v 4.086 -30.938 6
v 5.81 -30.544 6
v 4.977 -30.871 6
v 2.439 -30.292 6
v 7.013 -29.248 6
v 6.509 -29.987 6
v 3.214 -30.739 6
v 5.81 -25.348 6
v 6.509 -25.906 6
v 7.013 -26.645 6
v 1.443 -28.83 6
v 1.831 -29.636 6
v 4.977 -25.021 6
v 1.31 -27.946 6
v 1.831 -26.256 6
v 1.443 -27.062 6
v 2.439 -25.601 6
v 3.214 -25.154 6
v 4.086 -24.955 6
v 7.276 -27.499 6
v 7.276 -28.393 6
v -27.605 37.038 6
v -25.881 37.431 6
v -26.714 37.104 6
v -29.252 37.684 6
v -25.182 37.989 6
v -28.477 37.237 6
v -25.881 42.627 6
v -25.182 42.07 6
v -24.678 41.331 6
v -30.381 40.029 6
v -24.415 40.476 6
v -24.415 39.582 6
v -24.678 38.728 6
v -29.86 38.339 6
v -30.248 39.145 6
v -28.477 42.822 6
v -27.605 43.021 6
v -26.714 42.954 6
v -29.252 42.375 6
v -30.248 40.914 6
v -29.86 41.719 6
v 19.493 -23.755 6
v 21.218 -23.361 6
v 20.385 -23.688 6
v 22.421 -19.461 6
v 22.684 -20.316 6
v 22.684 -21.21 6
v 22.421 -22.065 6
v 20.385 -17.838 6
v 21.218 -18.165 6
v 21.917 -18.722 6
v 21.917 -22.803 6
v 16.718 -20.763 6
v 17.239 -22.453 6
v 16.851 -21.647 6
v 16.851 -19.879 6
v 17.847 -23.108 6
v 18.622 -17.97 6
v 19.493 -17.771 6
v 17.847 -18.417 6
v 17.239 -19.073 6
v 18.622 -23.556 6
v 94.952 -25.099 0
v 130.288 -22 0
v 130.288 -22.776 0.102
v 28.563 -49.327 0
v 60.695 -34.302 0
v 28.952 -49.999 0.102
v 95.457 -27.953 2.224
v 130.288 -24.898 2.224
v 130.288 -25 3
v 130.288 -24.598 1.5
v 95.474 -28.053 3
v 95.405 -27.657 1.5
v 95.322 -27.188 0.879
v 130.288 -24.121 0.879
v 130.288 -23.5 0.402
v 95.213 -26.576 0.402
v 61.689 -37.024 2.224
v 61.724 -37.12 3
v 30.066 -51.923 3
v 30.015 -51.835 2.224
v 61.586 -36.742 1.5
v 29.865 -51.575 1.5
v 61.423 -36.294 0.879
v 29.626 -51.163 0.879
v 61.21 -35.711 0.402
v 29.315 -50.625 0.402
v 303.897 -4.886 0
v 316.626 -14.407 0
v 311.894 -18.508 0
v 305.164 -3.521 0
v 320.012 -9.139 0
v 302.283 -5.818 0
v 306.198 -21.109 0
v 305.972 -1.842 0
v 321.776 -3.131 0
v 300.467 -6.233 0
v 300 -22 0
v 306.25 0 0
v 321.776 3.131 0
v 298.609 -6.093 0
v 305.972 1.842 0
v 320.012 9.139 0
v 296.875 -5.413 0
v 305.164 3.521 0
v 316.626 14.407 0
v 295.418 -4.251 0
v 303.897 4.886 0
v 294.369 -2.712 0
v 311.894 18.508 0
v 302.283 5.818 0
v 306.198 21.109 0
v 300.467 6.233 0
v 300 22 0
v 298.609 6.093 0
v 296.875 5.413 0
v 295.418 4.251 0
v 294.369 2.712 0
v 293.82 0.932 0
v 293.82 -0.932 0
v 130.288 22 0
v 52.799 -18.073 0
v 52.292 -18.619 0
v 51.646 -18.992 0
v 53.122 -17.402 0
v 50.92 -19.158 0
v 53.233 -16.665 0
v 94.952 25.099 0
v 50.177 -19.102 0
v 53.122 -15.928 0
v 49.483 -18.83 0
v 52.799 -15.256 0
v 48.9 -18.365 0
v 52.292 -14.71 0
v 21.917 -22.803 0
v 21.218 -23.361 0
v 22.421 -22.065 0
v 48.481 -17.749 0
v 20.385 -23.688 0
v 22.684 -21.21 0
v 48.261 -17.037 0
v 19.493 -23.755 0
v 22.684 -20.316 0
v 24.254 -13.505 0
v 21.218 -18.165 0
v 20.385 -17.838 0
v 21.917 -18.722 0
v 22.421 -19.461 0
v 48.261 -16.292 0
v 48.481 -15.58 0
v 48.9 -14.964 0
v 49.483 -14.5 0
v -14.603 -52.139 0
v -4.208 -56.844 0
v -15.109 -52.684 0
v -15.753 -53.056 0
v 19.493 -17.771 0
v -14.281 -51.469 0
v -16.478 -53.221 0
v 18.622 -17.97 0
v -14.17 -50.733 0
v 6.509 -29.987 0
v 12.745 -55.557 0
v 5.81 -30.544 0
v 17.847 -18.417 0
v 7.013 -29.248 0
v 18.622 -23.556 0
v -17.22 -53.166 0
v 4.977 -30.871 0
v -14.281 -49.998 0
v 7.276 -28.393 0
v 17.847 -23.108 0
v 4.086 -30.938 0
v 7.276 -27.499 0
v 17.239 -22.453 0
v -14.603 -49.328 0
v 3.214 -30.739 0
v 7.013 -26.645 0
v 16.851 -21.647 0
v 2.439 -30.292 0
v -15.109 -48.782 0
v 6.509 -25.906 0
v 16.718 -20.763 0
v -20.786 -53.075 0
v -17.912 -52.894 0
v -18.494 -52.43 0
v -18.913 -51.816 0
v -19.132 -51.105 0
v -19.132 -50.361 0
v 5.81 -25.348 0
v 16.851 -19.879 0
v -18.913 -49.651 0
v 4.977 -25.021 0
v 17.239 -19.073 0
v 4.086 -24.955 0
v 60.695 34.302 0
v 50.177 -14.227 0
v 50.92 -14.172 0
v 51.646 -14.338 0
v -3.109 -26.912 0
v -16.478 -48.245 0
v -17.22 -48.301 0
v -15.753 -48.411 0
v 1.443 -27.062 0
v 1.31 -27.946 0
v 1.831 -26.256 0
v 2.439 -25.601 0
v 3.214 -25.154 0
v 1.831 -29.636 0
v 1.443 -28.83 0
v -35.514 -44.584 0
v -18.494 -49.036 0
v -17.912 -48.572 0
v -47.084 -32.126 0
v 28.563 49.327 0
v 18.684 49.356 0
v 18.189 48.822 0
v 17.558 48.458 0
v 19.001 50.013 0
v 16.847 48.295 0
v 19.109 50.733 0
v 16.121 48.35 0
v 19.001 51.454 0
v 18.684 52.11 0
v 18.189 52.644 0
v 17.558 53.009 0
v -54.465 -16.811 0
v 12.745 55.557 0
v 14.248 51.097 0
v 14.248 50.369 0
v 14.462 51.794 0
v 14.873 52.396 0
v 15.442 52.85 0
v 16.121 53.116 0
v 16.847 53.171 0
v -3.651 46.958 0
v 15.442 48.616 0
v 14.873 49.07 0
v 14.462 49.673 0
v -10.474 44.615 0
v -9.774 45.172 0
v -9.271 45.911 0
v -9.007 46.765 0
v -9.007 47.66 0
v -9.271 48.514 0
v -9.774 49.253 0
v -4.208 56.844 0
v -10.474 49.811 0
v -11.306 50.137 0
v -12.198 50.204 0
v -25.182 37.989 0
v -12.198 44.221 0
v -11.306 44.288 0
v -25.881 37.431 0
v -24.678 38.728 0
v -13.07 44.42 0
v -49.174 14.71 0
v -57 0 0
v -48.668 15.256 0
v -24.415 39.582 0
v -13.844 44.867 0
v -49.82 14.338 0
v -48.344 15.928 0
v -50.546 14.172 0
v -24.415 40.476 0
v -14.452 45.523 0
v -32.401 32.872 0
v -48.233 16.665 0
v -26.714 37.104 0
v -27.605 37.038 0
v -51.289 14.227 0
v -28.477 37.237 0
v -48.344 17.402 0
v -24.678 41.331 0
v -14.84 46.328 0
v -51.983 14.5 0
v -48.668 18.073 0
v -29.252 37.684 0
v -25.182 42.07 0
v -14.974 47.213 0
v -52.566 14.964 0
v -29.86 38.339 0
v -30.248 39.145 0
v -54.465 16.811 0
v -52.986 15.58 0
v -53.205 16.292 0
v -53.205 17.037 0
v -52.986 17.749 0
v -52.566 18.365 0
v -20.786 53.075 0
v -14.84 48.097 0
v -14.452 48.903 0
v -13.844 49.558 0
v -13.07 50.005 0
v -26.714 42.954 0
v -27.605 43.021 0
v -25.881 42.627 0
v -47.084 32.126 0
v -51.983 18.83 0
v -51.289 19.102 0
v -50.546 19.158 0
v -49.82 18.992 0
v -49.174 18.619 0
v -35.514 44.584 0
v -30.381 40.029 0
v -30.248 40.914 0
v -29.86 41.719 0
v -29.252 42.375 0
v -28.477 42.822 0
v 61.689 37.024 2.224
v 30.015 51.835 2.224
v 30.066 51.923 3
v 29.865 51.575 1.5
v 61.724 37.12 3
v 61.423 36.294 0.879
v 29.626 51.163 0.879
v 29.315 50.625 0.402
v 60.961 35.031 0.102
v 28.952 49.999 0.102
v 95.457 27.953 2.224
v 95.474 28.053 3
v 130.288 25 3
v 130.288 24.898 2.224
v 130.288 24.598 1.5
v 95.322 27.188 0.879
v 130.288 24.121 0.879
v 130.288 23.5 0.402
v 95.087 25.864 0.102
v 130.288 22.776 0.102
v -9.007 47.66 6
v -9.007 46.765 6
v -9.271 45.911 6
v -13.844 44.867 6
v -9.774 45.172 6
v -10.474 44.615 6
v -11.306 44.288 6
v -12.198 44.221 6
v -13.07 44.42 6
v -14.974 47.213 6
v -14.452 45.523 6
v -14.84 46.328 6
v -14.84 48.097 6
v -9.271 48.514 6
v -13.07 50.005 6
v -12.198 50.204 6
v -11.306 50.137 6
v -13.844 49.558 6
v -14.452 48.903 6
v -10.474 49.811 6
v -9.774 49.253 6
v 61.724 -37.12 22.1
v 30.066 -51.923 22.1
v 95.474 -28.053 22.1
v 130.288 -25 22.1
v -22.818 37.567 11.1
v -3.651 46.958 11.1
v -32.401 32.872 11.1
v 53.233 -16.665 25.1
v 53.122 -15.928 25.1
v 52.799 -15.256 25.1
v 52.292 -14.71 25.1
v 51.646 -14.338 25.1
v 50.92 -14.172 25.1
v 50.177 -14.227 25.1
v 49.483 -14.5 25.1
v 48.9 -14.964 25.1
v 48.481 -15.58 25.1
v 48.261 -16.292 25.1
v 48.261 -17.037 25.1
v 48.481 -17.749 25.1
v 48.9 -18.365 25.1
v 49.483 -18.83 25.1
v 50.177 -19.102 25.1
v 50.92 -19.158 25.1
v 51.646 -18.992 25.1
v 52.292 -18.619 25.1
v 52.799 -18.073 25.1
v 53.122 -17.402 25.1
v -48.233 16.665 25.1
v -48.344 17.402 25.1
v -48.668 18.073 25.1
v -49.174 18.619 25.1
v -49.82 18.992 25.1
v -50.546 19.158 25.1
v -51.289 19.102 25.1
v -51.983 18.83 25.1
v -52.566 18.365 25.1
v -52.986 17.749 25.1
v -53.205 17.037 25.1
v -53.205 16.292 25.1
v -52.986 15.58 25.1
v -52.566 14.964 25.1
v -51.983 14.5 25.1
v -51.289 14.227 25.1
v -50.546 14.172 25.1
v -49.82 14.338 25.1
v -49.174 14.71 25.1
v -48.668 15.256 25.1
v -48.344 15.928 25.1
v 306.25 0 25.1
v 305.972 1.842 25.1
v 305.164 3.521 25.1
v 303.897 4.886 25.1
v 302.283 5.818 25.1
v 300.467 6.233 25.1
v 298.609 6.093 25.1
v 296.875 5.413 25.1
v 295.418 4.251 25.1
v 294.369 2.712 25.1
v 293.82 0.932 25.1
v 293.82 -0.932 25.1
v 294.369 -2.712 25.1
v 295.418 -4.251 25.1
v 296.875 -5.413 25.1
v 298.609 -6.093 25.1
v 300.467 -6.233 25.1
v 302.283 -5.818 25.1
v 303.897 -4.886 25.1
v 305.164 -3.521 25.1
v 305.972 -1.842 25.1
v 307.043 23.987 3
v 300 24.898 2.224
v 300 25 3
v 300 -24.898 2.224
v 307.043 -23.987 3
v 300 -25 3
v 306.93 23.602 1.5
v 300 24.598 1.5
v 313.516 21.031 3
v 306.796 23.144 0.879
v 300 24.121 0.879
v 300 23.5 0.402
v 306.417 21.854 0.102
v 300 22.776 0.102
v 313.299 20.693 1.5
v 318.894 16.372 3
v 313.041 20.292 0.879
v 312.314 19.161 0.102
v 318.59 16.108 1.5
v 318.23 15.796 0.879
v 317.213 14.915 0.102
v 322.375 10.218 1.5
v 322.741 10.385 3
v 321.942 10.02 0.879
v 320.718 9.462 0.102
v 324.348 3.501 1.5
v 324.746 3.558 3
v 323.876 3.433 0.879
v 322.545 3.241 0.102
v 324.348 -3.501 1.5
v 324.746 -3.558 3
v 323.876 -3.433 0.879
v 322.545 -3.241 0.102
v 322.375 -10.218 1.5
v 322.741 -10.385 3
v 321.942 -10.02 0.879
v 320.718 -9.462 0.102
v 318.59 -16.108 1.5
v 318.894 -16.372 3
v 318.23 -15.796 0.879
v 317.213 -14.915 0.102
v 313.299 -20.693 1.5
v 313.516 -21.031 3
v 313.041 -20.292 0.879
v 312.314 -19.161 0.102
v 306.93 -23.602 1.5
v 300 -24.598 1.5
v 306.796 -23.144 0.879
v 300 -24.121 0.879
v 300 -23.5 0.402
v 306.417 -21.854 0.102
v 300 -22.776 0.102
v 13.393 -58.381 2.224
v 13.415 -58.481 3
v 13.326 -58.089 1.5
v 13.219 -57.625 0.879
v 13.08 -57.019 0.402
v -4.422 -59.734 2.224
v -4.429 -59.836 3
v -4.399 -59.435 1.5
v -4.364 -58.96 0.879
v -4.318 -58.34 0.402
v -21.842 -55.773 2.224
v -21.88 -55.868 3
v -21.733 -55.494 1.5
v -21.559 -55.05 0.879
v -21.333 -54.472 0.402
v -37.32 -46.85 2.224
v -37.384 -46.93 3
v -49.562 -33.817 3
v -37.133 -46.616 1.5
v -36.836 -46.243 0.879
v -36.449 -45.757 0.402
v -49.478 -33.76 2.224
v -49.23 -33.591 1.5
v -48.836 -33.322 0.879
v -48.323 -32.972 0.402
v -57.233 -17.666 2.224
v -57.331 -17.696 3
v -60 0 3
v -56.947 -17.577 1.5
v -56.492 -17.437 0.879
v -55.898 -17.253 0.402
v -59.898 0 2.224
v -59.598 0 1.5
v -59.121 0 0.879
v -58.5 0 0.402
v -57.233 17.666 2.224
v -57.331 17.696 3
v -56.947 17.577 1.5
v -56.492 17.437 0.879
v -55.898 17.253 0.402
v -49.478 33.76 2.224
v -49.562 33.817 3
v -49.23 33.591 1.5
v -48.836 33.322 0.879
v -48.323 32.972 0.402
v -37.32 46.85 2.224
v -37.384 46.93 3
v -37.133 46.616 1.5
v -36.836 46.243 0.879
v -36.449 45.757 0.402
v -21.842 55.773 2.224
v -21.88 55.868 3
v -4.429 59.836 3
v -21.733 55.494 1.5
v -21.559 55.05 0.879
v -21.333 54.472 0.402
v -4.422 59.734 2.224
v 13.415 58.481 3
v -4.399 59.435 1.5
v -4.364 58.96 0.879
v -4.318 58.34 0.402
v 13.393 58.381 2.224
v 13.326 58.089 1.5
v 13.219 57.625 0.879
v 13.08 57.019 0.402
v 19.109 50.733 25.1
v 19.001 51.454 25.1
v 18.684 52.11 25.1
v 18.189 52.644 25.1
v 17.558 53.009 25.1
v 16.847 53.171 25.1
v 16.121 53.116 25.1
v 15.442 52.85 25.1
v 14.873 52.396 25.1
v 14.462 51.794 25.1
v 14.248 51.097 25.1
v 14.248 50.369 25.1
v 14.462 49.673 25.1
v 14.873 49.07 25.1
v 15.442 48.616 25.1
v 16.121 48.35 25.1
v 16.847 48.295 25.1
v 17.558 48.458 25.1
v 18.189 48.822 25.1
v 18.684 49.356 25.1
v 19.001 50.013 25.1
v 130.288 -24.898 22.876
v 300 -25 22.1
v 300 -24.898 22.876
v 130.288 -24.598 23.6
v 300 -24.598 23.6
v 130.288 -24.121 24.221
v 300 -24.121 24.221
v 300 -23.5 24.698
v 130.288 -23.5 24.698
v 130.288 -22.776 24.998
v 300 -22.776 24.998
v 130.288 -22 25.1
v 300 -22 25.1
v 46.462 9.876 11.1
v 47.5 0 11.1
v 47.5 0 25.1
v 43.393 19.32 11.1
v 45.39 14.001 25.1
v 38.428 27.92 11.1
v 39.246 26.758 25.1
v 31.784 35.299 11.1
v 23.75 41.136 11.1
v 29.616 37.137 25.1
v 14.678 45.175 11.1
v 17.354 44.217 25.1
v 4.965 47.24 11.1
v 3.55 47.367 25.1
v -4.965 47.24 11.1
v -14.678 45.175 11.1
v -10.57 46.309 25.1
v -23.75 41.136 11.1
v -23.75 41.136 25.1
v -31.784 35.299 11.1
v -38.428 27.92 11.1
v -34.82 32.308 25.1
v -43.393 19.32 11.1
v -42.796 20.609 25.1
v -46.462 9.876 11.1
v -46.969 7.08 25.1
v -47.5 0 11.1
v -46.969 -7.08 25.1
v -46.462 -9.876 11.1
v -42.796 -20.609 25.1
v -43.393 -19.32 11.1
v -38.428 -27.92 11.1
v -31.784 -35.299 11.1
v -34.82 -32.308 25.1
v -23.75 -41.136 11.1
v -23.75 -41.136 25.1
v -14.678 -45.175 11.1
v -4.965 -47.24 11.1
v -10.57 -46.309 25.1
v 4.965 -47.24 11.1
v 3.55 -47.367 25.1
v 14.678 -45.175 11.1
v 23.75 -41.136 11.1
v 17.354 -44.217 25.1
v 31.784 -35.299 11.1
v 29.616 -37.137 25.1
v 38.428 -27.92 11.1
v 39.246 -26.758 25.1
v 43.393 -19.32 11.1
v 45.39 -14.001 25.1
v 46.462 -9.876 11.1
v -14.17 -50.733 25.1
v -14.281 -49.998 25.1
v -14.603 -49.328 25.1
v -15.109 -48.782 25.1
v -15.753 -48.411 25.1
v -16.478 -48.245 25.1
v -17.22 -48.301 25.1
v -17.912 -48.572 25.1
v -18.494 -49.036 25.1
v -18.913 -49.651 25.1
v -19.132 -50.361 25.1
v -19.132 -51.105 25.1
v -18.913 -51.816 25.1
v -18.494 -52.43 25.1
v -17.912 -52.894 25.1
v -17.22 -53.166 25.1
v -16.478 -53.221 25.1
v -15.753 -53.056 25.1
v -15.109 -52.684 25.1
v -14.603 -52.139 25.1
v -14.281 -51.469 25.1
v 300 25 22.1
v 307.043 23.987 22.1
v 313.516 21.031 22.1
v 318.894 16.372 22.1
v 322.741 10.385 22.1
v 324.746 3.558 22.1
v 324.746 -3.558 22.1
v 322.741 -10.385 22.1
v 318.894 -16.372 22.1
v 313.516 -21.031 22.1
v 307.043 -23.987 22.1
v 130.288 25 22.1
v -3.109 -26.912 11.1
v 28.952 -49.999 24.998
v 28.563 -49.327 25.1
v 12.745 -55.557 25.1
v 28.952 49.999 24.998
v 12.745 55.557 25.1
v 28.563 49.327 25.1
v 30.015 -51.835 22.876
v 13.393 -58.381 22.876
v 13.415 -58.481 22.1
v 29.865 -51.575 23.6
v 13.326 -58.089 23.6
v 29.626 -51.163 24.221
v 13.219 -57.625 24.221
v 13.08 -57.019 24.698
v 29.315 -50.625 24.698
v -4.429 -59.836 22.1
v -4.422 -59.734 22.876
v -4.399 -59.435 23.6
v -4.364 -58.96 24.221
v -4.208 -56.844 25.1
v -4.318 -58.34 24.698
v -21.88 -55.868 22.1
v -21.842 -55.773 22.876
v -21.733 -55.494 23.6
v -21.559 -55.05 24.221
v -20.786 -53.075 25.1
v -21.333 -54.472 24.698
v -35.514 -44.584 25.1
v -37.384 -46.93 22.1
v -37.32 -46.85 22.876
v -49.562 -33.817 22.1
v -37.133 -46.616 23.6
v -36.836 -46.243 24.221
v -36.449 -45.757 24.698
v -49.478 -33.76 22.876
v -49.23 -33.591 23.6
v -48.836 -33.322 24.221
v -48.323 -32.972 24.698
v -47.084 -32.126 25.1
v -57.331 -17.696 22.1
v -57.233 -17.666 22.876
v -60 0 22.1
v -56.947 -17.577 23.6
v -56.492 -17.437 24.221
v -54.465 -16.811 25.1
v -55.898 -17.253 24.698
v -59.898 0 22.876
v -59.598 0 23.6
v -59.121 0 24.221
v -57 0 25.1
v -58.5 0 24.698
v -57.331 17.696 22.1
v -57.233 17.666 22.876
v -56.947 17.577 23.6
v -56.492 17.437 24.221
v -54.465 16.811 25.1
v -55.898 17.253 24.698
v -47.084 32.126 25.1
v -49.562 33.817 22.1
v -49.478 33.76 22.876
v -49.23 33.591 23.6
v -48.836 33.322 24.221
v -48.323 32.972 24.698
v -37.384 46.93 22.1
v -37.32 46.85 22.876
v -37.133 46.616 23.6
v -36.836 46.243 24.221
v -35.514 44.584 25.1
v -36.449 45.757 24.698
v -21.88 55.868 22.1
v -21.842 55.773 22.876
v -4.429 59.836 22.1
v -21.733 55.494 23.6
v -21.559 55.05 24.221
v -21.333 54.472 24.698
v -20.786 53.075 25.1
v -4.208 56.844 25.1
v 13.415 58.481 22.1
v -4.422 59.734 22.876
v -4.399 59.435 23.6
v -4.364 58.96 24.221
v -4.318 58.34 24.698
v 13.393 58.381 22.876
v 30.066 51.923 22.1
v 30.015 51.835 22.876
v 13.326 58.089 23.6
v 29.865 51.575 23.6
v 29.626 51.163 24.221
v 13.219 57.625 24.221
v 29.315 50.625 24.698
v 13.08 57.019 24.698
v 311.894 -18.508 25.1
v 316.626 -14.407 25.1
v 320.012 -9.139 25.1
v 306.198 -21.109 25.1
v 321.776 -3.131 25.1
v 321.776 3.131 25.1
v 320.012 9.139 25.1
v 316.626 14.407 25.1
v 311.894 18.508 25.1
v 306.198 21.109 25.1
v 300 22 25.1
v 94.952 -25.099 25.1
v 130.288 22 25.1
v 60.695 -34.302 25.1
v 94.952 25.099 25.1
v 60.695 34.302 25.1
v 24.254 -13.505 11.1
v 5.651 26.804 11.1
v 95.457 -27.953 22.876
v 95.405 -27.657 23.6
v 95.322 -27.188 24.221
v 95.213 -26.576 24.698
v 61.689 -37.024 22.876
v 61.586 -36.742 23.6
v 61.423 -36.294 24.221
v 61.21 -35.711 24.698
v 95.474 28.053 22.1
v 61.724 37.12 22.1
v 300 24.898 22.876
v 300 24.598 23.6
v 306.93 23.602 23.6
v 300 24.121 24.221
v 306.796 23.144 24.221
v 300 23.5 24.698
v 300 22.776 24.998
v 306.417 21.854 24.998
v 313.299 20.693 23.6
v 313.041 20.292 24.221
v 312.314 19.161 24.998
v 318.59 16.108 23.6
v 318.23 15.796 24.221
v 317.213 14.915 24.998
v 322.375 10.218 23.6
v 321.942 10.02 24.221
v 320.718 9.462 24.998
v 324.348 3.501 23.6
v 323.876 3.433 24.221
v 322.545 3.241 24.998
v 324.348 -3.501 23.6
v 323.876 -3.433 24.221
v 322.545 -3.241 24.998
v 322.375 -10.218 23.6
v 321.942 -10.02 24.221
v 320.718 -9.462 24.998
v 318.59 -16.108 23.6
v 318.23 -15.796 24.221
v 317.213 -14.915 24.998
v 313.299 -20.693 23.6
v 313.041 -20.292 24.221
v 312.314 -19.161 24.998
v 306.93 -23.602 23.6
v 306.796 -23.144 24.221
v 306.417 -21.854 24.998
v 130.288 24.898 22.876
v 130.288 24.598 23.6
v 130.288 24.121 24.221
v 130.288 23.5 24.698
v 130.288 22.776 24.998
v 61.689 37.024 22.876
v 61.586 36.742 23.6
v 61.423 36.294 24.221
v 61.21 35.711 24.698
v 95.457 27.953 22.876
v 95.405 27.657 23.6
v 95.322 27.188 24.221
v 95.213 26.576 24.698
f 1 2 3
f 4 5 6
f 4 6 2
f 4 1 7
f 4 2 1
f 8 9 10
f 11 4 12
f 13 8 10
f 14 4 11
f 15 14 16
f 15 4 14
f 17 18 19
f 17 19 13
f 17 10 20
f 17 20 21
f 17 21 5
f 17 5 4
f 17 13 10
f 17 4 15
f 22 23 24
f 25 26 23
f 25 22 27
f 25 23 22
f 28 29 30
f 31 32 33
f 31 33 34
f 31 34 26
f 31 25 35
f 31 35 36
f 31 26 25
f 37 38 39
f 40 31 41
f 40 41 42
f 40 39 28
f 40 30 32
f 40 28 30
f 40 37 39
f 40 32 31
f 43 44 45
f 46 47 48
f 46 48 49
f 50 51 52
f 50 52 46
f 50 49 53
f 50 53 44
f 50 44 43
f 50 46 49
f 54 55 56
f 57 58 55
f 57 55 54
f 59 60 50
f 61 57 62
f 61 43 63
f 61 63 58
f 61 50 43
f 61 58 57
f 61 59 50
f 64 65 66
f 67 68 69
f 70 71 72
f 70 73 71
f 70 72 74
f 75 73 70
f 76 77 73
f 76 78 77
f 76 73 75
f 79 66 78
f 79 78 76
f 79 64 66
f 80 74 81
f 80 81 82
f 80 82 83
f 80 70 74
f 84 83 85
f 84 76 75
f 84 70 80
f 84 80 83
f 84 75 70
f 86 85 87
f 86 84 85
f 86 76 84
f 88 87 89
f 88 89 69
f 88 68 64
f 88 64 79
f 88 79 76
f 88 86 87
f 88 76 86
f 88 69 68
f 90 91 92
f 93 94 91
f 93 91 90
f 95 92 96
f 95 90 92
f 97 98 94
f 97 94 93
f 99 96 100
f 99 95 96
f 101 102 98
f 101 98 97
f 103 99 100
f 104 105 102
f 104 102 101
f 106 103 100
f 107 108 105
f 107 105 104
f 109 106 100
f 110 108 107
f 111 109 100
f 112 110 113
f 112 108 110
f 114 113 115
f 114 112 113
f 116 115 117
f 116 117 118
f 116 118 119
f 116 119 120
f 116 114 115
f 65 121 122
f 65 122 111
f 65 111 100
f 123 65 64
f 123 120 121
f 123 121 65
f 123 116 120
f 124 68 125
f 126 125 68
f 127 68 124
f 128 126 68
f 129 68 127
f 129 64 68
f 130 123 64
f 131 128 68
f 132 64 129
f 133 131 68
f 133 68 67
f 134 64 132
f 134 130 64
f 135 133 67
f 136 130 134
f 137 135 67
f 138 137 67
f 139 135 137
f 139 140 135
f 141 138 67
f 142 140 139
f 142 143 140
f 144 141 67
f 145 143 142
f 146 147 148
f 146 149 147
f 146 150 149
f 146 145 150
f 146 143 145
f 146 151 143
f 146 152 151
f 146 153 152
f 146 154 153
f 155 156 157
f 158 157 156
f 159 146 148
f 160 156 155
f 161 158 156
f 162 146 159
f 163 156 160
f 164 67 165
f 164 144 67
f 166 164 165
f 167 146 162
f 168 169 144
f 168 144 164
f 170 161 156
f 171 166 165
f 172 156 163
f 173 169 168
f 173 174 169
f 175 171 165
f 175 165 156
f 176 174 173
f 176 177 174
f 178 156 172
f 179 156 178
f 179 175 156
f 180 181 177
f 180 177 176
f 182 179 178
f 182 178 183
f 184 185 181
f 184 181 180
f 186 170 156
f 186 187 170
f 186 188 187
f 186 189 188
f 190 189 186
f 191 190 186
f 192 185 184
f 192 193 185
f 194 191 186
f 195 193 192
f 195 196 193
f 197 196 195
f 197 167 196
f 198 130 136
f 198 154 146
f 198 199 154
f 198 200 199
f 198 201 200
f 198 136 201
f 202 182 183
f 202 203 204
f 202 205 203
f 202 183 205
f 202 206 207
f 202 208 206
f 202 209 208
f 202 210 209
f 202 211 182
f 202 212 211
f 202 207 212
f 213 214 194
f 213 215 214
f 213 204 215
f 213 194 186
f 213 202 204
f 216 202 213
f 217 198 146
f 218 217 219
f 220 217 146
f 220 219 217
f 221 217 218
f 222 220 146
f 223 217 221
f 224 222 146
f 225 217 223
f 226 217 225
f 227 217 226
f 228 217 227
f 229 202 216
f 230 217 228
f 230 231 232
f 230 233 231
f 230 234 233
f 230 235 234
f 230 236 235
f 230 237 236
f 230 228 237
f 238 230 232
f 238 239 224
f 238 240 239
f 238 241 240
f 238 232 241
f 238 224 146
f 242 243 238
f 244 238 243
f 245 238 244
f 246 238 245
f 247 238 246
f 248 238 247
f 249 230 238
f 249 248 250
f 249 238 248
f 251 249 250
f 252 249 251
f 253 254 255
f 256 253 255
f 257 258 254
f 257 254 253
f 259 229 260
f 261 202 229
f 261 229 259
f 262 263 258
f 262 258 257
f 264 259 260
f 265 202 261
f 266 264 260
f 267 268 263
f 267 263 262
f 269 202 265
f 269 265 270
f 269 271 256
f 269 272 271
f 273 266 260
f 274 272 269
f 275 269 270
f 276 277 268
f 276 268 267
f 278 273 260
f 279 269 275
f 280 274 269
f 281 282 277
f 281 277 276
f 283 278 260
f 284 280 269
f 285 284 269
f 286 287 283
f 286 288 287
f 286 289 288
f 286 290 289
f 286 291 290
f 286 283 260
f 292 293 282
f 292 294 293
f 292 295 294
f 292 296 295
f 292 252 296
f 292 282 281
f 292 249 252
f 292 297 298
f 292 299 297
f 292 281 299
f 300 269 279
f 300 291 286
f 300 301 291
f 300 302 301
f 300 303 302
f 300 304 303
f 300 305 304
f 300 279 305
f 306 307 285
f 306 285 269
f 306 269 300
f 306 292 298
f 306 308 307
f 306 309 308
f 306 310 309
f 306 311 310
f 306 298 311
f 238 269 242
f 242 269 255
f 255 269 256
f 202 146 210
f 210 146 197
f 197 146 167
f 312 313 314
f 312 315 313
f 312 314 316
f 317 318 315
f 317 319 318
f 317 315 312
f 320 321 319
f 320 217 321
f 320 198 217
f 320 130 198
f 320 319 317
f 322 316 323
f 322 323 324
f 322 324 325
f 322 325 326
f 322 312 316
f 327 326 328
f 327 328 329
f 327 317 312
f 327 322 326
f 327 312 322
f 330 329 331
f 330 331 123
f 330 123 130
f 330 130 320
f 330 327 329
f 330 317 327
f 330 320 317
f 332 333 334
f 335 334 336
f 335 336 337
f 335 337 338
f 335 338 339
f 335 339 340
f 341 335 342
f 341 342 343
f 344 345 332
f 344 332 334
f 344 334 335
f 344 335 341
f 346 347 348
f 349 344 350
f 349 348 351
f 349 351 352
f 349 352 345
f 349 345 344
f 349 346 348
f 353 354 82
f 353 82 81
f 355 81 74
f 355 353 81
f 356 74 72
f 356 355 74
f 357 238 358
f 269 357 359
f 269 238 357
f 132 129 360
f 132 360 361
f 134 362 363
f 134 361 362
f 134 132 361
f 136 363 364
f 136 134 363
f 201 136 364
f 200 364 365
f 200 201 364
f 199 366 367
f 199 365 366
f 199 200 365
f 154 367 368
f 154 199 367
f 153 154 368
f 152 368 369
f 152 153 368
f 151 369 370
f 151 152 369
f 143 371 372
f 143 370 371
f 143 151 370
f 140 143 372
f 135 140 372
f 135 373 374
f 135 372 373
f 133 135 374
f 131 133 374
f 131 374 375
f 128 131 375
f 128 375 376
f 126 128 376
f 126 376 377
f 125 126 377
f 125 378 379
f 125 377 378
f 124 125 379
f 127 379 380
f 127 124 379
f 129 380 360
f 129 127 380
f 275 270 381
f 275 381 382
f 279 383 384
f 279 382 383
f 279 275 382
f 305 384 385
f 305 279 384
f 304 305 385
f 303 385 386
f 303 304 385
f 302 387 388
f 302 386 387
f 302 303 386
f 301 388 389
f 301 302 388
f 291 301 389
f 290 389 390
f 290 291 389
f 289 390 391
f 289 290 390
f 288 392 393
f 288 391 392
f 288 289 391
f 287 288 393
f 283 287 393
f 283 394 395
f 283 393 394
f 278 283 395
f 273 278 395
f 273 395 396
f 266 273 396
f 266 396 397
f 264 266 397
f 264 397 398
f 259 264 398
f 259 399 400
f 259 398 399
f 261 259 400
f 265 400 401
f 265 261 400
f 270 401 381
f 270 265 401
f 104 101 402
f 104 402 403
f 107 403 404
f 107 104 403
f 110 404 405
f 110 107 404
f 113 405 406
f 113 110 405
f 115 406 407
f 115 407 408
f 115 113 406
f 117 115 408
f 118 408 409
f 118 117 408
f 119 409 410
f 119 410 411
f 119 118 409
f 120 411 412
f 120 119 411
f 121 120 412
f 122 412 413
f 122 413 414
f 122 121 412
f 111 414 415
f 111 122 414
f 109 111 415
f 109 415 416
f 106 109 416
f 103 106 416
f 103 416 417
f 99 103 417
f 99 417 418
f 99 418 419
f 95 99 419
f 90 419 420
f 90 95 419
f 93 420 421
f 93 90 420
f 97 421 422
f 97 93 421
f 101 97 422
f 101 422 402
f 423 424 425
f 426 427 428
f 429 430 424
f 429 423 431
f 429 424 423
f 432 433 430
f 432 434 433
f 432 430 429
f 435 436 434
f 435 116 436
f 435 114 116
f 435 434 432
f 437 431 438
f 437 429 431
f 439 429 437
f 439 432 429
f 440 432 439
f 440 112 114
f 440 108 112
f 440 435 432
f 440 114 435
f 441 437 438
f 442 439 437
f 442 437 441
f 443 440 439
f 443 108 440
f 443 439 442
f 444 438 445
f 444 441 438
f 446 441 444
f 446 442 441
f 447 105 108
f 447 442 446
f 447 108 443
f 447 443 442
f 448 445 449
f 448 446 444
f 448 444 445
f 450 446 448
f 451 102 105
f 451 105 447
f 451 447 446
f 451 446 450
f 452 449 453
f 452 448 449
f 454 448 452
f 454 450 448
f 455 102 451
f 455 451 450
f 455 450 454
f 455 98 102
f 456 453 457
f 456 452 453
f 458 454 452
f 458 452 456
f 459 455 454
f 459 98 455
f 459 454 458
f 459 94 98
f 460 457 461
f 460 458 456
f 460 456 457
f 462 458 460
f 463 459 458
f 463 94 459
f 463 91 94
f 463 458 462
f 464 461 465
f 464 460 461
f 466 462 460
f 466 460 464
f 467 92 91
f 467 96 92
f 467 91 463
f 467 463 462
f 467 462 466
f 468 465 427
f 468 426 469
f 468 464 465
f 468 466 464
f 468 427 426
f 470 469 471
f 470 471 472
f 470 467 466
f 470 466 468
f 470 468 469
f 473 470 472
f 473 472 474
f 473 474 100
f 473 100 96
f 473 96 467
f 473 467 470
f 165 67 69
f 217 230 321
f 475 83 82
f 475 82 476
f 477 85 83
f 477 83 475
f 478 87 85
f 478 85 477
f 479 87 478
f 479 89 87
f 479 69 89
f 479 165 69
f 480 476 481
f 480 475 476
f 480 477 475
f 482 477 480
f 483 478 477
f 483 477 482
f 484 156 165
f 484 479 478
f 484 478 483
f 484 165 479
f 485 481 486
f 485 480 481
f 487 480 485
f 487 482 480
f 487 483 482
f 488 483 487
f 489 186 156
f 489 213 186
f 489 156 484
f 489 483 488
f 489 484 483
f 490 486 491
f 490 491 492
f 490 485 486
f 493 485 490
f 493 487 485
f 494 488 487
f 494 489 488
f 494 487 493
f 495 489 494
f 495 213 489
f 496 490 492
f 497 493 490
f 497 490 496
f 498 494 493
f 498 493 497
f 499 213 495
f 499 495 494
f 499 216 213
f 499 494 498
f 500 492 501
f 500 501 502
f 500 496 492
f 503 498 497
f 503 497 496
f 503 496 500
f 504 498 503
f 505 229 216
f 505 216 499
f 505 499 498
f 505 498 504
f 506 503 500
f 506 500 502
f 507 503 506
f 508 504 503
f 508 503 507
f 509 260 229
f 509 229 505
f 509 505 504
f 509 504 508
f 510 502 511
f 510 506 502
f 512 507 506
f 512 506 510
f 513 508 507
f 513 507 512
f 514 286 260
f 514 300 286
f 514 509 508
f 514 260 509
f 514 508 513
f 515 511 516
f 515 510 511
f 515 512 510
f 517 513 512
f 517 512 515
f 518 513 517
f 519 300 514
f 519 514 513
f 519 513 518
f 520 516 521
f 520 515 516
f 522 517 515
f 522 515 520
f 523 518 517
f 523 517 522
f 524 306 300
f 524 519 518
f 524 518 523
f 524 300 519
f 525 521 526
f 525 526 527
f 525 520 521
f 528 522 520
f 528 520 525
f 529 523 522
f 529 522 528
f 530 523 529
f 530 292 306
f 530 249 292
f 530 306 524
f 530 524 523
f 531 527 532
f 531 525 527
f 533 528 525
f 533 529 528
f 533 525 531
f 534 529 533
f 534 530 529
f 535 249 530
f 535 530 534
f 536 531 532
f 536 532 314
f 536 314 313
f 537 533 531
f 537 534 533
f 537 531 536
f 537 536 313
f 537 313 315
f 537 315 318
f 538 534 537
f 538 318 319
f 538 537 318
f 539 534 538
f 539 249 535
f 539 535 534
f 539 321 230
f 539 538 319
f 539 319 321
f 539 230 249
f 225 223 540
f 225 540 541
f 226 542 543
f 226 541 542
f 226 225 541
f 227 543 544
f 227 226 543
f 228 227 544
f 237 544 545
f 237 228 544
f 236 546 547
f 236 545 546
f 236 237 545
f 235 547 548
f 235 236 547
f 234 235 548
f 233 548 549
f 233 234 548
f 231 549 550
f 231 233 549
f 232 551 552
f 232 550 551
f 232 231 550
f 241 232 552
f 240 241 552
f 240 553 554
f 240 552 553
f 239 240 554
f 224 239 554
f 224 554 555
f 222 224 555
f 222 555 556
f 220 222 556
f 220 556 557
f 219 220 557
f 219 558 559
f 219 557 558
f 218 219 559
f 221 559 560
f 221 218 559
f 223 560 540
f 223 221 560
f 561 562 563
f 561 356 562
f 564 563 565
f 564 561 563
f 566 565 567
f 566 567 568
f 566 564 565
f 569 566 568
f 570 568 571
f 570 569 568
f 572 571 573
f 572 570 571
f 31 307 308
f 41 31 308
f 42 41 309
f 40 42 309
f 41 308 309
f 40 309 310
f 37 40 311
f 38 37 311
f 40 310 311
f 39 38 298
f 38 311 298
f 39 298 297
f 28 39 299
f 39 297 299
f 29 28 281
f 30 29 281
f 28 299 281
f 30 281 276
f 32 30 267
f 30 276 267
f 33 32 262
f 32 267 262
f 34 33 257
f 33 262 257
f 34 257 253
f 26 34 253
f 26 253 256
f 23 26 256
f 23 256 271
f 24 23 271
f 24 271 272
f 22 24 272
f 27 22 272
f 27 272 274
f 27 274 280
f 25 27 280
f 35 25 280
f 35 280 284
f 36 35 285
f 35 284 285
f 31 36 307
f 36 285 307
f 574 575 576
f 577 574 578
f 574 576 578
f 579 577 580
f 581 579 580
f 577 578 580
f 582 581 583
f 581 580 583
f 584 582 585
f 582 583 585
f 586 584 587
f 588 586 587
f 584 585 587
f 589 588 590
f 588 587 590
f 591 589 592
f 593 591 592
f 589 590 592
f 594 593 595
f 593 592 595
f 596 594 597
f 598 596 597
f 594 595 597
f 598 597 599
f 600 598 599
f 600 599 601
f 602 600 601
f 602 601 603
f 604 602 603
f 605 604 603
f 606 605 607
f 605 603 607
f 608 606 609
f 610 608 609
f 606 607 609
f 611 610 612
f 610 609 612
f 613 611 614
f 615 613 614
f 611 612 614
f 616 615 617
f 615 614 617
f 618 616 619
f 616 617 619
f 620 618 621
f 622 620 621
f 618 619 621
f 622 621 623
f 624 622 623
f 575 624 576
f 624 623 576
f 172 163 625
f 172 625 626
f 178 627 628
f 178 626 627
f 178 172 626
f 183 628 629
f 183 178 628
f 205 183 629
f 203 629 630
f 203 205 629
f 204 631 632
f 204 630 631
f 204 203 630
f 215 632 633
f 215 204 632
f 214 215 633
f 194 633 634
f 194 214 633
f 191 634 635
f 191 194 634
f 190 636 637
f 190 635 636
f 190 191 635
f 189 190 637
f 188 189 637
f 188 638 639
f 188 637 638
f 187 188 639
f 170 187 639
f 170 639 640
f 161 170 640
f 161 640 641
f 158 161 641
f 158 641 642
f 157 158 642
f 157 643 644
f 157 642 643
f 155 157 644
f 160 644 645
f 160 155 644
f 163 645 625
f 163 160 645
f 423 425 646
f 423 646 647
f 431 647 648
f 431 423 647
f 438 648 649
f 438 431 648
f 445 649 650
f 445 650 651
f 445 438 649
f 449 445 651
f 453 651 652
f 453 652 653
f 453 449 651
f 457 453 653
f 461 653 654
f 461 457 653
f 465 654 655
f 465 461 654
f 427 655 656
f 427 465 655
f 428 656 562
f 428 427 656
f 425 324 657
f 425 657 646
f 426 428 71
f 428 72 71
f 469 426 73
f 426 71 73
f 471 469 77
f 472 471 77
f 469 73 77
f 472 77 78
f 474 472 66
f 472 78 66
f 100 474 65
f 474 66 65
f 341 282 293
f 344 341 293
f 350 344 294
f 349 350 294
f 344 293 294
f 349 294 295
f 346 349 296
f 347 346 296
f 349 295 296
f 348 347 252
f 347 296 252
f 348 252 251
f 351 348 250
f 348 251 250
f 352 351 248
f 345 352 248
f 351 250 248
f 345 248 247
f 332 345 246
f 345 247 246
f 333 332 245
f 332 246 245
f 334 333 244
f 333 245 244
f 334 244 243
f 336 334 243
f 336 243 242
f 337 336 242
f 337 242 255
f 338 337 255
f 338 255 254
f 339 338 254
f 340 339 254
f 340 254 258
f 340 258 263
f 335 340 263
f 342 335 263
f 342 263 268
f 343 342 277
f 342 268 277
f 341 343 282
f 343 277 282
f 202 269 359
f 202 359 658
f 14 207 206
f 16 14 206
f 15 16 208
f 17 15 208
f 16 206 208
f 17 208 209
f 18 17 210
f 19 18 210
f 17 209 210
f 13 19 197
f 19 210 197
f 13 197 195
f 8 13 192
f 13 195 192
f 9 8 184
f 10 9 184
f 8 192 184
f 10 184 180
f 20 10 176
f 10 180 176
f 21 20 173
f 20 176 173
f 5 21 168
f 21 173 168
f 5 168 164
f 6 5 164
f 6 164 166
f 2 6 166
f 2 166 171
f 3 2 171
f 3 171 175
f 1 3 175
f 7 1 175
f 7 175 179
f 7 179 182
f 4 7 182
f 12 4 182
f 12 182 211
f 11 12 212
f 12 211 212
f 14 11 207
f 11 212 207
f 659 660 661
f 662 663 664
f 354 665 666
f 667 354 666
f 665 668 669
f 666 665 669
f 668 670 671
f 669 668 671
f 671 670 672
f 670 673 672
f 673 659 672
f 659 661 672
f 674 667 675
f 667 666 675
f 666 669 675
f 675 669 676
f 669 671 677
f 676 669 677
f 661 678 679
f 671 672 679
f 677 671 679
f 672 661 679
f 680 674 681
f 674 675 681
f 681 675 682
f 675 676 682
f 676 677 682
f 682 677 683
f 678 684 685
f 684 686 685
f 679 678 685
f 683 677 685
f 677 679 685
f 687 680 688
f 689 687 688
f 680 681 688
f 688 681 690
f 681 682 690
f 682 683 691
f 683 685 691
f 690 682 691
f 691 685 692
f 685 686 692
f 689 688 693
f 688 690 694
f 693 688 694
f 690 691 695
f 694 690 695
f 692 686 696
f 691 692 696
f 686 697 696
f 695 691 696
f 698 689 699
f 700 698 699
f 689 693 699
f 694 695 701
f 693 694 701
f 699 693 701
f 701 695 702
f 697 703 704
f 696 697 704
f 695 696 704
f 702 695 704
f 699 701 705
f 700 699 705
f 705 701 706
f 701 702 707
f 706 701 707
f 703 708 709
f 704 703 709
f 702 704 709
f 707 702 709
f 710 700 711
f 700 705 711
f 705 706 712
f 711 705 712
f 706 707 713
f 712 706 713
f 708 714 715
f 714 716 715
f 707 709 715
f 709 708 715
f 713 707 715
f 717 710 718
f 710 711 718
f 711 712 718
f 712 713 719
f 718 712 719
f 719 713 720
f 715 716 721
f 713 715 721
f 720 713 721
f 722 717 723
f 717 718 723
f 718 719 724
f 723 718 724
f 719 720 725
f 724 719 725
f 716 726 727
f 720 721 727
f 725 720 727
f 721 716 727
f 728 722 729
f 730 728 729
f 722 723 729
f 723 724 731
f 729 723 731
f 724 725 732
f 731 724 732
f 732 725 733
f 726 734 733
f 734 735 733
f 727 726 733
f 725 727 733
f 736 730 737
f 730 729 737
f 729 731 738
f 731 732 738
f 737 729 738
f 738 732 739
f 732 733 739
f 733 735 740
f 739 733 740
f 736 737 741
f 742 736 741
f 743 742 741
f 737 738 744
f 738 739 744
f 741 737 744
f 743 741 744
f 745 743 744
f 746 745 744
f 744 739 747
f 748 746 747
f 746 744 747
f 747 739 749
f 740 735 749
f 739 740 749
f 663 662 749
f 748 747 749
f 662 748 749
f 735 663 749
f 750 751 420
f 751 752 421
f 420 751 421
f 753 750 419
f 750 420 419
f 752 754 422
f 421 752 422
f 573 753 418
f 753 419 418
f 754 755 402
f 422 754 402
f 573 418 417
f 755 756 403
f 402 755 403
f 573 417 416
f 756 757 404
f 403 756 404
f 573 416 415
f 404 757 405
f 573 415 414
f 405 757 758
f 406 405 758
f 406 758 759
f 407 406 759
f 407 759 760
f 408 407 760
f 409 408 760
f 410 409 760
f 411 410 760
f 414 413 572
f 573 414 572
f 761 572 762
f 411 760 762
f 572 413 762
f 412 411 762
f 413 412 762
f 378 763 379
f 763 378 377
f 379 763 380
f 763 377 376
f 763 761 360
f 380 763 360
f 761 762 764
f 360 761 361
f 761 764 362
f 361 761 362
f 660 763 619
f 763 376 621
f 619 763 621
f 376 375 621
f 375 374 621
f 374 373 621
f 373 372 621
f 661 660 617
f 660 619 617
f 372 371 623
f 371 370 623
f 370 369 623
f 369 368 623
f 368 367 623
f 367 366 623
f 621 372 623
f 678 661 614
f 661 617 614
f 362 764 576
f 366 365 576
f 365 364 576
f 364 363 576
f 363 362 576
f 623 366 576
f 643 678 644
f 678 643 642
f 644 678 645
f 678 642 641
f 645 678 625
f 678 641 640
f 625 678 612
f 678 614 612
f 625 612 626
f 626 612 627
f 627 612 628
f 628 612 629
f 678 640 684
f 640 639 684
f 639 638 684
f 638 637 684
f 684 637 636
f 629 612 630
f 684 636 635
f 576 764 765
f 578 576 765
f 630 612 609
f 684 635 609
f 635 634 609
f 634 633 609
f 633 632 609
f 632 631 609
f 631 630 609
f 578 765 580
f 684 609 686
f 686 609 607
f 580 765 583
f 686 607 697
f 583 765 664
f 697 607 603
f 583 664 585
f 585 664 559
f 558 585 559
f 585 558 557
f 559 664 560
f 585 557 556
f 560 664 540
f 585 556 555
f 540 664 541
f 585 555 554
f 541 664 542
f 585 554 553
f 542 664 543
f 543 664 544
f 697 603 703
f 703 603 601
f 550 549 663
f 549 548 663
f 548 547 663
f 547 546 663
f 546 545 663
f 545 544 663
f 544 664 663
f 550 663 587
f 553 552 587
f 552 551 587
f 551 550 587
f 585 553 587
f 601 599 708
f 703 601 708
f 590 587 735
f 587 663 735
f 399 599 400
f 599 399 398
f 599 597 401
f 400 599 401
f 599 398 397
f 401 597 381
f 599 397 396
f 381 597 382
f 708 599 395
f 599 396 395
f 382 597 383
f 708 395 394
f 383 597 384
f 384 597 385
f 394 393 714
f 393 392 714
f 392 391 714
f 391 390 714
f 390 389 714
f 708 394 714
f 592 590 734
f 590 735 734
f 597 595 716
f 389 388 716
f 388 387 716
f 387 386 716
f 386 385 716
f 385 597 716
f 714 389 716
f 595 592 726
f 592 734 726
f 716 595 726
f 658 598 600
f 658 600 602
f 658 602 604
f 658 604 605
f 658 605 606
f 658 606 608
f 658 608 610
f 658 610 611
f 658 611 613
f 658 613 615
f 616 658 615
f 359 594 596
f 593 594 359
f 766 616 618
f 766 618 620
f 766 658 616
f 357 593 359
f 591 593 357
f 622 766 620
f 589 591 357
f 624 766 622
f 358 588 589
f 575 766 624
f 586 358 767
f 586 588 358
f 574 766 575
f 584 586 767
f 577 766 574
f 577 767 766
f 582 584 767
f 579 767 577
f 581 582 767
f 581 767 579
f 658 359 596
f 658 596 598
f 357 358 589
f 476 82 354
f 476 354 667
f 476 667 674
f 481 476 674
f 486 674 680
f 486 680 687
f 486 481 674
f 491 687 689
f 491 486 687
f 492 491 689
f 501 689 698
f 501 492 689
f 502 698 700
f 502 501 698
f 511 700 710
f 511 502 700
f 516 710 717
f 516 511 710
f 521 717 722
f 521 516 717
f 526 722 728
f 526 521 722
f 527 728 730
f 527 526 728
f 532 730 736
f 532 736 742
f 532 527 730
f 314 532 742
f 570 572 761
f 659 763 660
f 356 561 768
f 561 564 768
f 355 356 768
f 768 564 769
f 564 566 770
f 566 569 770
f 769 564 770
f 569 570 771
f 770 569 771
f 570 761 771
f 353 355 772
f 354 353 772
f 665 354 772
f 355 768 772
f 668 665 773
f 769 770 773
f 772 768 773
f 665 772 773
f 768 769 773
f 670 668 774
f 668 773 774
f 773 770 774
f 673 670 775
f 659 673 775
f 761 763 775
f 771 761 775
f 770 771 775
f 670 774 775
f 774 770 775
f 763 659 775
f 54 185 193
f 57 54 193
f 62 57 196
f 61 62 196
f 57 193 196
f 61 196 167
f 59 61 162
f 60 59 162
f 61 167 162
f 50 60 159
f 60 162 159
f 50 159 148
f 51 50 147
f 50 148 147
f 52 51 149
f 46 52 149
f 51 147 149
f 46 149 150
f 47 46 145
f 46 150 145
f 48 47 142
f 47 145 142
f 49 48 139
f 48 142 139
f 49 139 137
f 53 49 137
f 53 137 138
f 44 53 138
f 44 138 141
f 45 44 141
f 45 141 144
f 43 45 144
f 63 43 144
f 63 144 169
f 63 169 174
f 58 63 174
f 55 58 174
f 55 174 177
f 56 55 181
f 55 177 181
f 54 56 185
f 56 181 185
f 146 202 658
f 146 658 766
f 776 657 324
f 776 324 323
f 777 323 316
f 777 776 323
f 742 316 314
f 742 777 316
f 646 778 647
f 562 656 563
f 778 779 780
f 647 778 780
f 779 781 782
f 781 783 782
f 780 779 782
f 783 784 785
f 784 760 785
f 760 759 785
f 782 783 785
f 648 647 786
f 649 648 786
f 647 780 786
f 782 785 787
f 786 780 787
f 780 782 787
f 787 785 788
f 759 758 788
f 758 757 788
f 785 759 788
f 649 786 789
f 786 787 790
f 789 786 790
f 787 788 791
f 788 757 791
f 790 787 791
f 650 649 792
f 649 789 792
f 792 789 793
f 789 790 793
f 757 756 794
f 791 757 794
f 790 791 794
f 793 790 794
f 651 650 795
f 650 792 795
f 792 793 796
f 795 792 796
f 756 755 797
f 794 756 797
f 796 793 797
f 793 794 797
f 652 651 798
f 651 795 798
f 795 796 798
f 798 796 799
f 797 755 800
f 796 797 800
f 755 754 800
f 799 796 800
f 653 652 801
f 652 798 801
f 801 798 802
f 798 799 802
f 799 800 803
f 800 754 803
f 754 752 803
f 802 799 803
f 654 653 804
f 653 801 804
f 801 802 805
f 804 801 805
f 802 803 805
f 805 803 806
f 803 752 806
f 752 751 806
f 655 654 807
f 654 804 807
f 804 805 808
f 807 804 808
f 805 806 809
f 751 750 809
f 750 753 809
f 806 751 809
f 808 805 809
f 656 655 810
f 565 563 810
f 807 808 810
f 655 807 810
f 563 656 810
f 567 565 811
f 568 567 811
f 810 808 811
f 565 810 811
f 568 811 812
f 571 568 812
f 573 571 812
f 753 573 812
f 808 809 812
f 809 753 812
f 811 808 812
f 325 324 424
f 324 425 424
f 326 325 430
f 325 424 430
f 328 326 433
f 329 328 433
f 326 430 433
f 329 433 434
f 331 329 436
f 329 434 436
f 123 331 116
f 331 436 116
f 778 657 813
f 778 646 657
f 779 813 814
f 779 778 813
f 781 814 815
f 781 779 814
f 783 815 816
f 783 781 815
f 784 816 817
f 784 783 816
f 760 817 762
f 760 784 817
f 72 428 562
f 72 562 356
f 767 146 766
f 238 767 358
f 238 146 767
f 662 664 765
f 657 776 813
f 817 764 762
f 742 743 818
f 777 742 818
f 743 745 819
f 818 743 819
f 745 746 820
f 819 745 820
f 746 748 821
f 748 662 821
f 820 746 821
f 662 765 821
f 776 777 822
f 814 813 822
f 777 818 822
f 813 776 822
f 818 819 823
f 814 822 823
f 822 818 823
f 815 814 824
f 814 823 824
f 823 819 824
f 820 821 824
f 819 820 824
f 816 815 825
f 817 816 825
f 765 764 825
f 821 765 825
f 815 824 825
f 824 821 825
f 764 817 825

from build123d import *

# Parameters (mm, degrees)
SKETCH1_R               = 6.25
BOSS_EXTRUDE1_DEPTH     = 25.1
SKETCH3_R               = 47.5
CUT_EXTRUDE2_DEPTH      = 14
CUT_EXTRUDE5_DEPTH      = 332.443826311
CUT_EXTRUDE5_DEPTH_BACK = 332.443826311
SKETCH2_R               = 2.494998654
SKETCH2_R_2             = 2.5
SKETCH2_R_3             = 2.444443829
SKETCH6_R               = 3
CUT_EXTRUDE6_DEPTH      = 6
CUT_EXTRUDE7_DEPTH      = 331.788452035
CUT_EXTRUDE7_DEPTH_BACK = 331.788452035
FILLET1_R               = 200
FILLET2_R               = 3


with BuildPart() as part:
    # Sketch1 → Boss-Extrude1 (new body)
    with BuildSketch(Plane.XY):
        with BuildLine():
            Line((54.543560573, 25), (300, 25))
            ThreePointArc((300, 25), (325, 0), (300, -25))
            Line((300, -25), (54.543560573, -25))
            ThreePointArc((54.543560573, -25), (-60, 0), (54.543560573, 25))
        make_face()
        with Locations((300, 0)):
            Circle(SKETCH1_R, mode=Mode.SUBTRACT)
    extrude(amount=BOSS_EXTRUDE1_DEPTH)

    # Sketch3 → Cut-Extrude2 (cut)
    with BuildSketch(Plane.XY.offset(25.1)):
        Circle(SKETCH3_R)
    extrude(amount=-CUT_EXTRUDE2_DEPTH, mode=Mode.SUBTRACT)

    # Sketch2 → Cut-Extrude5 (cut, two sides: drawn at the far end of the back side and taken through both)
    with BuildSketch(Plane.XY.offset(25.1).offset(-CUT_EXTRUDE5_DEPTH_BACK)):
        with Locations((-16.664697145, -50.733104448)):
            Circle(SKETCH2_R)
        with Locations((-50.733105114, 16.664696544)):
            Circle(SKETCH2_R_2)
        with Locations((16.664695878, 50.733104512)):
            Circle(SKETCH2_R_3)
        with Locations((50.733103846, -16.66469648)):
            Circle(SKETCH2_R_2)
    extrude(amount=CUT_EXTRUDE5_DEPTH + CUT_EXTRUDE5_DEPTH_BACK, mode=Mode.SUBTRACT)

    # Sketch6 → Cut-Extrude6 (cut)
    with BuildSketch(Plane(origin=(0, 0, 0), x_dir=(-1, 0, 0), z_dir=(0, 0, -1))):
        with Locations((11.973502988, 47.212610548)):
            Circle(SKETCH6_R)
        with Locations((27.381285989, 40.029281029)):
            Circle(SKETCH6_R)
        with Locations((-19.717656658, -20.762902692)):
            Circle(SKETCH6_R)
        with Locations((-4.309873657, -27.946232212)):
            Circle(SKETCH6_R)
    extrude(amount=-CUT_EXTRUDE6_DEPTH, mode=Mode.SUBTRACT)

    # Sketch7 → Cut-Extrude7 (cut, two sides: drawn at the far end of the back side and taken through both)
    with BuildSketch(Plane.XY.offset(11.1).offset(-CUT_EXTRUDE7_DEPTH_BACK)):
        Polygon((-32.400942803, 32.871850778), (-3.10901045, -26.912408633), (24.254242539, -13.505492441), (-3.650778768, 46.958298756), align=None)
    extrude(amount=CUT_EXTRUDE7_DEPTH + CUT_EXTRUDE7_DEPTH_BACK, mode=Mode.SUBTRACT)

    # Fillet1
    fillet1_edges = [part.edges().sort_by_distance(p)[0] for p in [
        (54.543560573, 25, 12.55),
        (54.543560573, -25, 12.55),
    ]]
    fillet(fillet1_edges, radius=FILLET1_R)

    # Fillet2
    fillet2_edges = [part.edges().sort_by_distance(p)[0] for p in [
        (325, 0, 25.1),
        (215.144071104, 25, 25.1),
        (215.144071104, 25, 0),
        (325, 0, 0),
        (215.144071104, -25, 0),
        (215.144071104, -25, 25.1),
        (-60, 0, 0),
        (-60, 0, 25.1),
        (78.400690042, -31.848007239, 0),
        (78.400690042, -31.848007239, 25.1),
        (78.400690042, 31.848007239, 0),
        (78.400690042, 31.848007239, 25.1),
    ]]
    fillet(fillet2_edges, radius=FILLET2_R)


solid = part.part
